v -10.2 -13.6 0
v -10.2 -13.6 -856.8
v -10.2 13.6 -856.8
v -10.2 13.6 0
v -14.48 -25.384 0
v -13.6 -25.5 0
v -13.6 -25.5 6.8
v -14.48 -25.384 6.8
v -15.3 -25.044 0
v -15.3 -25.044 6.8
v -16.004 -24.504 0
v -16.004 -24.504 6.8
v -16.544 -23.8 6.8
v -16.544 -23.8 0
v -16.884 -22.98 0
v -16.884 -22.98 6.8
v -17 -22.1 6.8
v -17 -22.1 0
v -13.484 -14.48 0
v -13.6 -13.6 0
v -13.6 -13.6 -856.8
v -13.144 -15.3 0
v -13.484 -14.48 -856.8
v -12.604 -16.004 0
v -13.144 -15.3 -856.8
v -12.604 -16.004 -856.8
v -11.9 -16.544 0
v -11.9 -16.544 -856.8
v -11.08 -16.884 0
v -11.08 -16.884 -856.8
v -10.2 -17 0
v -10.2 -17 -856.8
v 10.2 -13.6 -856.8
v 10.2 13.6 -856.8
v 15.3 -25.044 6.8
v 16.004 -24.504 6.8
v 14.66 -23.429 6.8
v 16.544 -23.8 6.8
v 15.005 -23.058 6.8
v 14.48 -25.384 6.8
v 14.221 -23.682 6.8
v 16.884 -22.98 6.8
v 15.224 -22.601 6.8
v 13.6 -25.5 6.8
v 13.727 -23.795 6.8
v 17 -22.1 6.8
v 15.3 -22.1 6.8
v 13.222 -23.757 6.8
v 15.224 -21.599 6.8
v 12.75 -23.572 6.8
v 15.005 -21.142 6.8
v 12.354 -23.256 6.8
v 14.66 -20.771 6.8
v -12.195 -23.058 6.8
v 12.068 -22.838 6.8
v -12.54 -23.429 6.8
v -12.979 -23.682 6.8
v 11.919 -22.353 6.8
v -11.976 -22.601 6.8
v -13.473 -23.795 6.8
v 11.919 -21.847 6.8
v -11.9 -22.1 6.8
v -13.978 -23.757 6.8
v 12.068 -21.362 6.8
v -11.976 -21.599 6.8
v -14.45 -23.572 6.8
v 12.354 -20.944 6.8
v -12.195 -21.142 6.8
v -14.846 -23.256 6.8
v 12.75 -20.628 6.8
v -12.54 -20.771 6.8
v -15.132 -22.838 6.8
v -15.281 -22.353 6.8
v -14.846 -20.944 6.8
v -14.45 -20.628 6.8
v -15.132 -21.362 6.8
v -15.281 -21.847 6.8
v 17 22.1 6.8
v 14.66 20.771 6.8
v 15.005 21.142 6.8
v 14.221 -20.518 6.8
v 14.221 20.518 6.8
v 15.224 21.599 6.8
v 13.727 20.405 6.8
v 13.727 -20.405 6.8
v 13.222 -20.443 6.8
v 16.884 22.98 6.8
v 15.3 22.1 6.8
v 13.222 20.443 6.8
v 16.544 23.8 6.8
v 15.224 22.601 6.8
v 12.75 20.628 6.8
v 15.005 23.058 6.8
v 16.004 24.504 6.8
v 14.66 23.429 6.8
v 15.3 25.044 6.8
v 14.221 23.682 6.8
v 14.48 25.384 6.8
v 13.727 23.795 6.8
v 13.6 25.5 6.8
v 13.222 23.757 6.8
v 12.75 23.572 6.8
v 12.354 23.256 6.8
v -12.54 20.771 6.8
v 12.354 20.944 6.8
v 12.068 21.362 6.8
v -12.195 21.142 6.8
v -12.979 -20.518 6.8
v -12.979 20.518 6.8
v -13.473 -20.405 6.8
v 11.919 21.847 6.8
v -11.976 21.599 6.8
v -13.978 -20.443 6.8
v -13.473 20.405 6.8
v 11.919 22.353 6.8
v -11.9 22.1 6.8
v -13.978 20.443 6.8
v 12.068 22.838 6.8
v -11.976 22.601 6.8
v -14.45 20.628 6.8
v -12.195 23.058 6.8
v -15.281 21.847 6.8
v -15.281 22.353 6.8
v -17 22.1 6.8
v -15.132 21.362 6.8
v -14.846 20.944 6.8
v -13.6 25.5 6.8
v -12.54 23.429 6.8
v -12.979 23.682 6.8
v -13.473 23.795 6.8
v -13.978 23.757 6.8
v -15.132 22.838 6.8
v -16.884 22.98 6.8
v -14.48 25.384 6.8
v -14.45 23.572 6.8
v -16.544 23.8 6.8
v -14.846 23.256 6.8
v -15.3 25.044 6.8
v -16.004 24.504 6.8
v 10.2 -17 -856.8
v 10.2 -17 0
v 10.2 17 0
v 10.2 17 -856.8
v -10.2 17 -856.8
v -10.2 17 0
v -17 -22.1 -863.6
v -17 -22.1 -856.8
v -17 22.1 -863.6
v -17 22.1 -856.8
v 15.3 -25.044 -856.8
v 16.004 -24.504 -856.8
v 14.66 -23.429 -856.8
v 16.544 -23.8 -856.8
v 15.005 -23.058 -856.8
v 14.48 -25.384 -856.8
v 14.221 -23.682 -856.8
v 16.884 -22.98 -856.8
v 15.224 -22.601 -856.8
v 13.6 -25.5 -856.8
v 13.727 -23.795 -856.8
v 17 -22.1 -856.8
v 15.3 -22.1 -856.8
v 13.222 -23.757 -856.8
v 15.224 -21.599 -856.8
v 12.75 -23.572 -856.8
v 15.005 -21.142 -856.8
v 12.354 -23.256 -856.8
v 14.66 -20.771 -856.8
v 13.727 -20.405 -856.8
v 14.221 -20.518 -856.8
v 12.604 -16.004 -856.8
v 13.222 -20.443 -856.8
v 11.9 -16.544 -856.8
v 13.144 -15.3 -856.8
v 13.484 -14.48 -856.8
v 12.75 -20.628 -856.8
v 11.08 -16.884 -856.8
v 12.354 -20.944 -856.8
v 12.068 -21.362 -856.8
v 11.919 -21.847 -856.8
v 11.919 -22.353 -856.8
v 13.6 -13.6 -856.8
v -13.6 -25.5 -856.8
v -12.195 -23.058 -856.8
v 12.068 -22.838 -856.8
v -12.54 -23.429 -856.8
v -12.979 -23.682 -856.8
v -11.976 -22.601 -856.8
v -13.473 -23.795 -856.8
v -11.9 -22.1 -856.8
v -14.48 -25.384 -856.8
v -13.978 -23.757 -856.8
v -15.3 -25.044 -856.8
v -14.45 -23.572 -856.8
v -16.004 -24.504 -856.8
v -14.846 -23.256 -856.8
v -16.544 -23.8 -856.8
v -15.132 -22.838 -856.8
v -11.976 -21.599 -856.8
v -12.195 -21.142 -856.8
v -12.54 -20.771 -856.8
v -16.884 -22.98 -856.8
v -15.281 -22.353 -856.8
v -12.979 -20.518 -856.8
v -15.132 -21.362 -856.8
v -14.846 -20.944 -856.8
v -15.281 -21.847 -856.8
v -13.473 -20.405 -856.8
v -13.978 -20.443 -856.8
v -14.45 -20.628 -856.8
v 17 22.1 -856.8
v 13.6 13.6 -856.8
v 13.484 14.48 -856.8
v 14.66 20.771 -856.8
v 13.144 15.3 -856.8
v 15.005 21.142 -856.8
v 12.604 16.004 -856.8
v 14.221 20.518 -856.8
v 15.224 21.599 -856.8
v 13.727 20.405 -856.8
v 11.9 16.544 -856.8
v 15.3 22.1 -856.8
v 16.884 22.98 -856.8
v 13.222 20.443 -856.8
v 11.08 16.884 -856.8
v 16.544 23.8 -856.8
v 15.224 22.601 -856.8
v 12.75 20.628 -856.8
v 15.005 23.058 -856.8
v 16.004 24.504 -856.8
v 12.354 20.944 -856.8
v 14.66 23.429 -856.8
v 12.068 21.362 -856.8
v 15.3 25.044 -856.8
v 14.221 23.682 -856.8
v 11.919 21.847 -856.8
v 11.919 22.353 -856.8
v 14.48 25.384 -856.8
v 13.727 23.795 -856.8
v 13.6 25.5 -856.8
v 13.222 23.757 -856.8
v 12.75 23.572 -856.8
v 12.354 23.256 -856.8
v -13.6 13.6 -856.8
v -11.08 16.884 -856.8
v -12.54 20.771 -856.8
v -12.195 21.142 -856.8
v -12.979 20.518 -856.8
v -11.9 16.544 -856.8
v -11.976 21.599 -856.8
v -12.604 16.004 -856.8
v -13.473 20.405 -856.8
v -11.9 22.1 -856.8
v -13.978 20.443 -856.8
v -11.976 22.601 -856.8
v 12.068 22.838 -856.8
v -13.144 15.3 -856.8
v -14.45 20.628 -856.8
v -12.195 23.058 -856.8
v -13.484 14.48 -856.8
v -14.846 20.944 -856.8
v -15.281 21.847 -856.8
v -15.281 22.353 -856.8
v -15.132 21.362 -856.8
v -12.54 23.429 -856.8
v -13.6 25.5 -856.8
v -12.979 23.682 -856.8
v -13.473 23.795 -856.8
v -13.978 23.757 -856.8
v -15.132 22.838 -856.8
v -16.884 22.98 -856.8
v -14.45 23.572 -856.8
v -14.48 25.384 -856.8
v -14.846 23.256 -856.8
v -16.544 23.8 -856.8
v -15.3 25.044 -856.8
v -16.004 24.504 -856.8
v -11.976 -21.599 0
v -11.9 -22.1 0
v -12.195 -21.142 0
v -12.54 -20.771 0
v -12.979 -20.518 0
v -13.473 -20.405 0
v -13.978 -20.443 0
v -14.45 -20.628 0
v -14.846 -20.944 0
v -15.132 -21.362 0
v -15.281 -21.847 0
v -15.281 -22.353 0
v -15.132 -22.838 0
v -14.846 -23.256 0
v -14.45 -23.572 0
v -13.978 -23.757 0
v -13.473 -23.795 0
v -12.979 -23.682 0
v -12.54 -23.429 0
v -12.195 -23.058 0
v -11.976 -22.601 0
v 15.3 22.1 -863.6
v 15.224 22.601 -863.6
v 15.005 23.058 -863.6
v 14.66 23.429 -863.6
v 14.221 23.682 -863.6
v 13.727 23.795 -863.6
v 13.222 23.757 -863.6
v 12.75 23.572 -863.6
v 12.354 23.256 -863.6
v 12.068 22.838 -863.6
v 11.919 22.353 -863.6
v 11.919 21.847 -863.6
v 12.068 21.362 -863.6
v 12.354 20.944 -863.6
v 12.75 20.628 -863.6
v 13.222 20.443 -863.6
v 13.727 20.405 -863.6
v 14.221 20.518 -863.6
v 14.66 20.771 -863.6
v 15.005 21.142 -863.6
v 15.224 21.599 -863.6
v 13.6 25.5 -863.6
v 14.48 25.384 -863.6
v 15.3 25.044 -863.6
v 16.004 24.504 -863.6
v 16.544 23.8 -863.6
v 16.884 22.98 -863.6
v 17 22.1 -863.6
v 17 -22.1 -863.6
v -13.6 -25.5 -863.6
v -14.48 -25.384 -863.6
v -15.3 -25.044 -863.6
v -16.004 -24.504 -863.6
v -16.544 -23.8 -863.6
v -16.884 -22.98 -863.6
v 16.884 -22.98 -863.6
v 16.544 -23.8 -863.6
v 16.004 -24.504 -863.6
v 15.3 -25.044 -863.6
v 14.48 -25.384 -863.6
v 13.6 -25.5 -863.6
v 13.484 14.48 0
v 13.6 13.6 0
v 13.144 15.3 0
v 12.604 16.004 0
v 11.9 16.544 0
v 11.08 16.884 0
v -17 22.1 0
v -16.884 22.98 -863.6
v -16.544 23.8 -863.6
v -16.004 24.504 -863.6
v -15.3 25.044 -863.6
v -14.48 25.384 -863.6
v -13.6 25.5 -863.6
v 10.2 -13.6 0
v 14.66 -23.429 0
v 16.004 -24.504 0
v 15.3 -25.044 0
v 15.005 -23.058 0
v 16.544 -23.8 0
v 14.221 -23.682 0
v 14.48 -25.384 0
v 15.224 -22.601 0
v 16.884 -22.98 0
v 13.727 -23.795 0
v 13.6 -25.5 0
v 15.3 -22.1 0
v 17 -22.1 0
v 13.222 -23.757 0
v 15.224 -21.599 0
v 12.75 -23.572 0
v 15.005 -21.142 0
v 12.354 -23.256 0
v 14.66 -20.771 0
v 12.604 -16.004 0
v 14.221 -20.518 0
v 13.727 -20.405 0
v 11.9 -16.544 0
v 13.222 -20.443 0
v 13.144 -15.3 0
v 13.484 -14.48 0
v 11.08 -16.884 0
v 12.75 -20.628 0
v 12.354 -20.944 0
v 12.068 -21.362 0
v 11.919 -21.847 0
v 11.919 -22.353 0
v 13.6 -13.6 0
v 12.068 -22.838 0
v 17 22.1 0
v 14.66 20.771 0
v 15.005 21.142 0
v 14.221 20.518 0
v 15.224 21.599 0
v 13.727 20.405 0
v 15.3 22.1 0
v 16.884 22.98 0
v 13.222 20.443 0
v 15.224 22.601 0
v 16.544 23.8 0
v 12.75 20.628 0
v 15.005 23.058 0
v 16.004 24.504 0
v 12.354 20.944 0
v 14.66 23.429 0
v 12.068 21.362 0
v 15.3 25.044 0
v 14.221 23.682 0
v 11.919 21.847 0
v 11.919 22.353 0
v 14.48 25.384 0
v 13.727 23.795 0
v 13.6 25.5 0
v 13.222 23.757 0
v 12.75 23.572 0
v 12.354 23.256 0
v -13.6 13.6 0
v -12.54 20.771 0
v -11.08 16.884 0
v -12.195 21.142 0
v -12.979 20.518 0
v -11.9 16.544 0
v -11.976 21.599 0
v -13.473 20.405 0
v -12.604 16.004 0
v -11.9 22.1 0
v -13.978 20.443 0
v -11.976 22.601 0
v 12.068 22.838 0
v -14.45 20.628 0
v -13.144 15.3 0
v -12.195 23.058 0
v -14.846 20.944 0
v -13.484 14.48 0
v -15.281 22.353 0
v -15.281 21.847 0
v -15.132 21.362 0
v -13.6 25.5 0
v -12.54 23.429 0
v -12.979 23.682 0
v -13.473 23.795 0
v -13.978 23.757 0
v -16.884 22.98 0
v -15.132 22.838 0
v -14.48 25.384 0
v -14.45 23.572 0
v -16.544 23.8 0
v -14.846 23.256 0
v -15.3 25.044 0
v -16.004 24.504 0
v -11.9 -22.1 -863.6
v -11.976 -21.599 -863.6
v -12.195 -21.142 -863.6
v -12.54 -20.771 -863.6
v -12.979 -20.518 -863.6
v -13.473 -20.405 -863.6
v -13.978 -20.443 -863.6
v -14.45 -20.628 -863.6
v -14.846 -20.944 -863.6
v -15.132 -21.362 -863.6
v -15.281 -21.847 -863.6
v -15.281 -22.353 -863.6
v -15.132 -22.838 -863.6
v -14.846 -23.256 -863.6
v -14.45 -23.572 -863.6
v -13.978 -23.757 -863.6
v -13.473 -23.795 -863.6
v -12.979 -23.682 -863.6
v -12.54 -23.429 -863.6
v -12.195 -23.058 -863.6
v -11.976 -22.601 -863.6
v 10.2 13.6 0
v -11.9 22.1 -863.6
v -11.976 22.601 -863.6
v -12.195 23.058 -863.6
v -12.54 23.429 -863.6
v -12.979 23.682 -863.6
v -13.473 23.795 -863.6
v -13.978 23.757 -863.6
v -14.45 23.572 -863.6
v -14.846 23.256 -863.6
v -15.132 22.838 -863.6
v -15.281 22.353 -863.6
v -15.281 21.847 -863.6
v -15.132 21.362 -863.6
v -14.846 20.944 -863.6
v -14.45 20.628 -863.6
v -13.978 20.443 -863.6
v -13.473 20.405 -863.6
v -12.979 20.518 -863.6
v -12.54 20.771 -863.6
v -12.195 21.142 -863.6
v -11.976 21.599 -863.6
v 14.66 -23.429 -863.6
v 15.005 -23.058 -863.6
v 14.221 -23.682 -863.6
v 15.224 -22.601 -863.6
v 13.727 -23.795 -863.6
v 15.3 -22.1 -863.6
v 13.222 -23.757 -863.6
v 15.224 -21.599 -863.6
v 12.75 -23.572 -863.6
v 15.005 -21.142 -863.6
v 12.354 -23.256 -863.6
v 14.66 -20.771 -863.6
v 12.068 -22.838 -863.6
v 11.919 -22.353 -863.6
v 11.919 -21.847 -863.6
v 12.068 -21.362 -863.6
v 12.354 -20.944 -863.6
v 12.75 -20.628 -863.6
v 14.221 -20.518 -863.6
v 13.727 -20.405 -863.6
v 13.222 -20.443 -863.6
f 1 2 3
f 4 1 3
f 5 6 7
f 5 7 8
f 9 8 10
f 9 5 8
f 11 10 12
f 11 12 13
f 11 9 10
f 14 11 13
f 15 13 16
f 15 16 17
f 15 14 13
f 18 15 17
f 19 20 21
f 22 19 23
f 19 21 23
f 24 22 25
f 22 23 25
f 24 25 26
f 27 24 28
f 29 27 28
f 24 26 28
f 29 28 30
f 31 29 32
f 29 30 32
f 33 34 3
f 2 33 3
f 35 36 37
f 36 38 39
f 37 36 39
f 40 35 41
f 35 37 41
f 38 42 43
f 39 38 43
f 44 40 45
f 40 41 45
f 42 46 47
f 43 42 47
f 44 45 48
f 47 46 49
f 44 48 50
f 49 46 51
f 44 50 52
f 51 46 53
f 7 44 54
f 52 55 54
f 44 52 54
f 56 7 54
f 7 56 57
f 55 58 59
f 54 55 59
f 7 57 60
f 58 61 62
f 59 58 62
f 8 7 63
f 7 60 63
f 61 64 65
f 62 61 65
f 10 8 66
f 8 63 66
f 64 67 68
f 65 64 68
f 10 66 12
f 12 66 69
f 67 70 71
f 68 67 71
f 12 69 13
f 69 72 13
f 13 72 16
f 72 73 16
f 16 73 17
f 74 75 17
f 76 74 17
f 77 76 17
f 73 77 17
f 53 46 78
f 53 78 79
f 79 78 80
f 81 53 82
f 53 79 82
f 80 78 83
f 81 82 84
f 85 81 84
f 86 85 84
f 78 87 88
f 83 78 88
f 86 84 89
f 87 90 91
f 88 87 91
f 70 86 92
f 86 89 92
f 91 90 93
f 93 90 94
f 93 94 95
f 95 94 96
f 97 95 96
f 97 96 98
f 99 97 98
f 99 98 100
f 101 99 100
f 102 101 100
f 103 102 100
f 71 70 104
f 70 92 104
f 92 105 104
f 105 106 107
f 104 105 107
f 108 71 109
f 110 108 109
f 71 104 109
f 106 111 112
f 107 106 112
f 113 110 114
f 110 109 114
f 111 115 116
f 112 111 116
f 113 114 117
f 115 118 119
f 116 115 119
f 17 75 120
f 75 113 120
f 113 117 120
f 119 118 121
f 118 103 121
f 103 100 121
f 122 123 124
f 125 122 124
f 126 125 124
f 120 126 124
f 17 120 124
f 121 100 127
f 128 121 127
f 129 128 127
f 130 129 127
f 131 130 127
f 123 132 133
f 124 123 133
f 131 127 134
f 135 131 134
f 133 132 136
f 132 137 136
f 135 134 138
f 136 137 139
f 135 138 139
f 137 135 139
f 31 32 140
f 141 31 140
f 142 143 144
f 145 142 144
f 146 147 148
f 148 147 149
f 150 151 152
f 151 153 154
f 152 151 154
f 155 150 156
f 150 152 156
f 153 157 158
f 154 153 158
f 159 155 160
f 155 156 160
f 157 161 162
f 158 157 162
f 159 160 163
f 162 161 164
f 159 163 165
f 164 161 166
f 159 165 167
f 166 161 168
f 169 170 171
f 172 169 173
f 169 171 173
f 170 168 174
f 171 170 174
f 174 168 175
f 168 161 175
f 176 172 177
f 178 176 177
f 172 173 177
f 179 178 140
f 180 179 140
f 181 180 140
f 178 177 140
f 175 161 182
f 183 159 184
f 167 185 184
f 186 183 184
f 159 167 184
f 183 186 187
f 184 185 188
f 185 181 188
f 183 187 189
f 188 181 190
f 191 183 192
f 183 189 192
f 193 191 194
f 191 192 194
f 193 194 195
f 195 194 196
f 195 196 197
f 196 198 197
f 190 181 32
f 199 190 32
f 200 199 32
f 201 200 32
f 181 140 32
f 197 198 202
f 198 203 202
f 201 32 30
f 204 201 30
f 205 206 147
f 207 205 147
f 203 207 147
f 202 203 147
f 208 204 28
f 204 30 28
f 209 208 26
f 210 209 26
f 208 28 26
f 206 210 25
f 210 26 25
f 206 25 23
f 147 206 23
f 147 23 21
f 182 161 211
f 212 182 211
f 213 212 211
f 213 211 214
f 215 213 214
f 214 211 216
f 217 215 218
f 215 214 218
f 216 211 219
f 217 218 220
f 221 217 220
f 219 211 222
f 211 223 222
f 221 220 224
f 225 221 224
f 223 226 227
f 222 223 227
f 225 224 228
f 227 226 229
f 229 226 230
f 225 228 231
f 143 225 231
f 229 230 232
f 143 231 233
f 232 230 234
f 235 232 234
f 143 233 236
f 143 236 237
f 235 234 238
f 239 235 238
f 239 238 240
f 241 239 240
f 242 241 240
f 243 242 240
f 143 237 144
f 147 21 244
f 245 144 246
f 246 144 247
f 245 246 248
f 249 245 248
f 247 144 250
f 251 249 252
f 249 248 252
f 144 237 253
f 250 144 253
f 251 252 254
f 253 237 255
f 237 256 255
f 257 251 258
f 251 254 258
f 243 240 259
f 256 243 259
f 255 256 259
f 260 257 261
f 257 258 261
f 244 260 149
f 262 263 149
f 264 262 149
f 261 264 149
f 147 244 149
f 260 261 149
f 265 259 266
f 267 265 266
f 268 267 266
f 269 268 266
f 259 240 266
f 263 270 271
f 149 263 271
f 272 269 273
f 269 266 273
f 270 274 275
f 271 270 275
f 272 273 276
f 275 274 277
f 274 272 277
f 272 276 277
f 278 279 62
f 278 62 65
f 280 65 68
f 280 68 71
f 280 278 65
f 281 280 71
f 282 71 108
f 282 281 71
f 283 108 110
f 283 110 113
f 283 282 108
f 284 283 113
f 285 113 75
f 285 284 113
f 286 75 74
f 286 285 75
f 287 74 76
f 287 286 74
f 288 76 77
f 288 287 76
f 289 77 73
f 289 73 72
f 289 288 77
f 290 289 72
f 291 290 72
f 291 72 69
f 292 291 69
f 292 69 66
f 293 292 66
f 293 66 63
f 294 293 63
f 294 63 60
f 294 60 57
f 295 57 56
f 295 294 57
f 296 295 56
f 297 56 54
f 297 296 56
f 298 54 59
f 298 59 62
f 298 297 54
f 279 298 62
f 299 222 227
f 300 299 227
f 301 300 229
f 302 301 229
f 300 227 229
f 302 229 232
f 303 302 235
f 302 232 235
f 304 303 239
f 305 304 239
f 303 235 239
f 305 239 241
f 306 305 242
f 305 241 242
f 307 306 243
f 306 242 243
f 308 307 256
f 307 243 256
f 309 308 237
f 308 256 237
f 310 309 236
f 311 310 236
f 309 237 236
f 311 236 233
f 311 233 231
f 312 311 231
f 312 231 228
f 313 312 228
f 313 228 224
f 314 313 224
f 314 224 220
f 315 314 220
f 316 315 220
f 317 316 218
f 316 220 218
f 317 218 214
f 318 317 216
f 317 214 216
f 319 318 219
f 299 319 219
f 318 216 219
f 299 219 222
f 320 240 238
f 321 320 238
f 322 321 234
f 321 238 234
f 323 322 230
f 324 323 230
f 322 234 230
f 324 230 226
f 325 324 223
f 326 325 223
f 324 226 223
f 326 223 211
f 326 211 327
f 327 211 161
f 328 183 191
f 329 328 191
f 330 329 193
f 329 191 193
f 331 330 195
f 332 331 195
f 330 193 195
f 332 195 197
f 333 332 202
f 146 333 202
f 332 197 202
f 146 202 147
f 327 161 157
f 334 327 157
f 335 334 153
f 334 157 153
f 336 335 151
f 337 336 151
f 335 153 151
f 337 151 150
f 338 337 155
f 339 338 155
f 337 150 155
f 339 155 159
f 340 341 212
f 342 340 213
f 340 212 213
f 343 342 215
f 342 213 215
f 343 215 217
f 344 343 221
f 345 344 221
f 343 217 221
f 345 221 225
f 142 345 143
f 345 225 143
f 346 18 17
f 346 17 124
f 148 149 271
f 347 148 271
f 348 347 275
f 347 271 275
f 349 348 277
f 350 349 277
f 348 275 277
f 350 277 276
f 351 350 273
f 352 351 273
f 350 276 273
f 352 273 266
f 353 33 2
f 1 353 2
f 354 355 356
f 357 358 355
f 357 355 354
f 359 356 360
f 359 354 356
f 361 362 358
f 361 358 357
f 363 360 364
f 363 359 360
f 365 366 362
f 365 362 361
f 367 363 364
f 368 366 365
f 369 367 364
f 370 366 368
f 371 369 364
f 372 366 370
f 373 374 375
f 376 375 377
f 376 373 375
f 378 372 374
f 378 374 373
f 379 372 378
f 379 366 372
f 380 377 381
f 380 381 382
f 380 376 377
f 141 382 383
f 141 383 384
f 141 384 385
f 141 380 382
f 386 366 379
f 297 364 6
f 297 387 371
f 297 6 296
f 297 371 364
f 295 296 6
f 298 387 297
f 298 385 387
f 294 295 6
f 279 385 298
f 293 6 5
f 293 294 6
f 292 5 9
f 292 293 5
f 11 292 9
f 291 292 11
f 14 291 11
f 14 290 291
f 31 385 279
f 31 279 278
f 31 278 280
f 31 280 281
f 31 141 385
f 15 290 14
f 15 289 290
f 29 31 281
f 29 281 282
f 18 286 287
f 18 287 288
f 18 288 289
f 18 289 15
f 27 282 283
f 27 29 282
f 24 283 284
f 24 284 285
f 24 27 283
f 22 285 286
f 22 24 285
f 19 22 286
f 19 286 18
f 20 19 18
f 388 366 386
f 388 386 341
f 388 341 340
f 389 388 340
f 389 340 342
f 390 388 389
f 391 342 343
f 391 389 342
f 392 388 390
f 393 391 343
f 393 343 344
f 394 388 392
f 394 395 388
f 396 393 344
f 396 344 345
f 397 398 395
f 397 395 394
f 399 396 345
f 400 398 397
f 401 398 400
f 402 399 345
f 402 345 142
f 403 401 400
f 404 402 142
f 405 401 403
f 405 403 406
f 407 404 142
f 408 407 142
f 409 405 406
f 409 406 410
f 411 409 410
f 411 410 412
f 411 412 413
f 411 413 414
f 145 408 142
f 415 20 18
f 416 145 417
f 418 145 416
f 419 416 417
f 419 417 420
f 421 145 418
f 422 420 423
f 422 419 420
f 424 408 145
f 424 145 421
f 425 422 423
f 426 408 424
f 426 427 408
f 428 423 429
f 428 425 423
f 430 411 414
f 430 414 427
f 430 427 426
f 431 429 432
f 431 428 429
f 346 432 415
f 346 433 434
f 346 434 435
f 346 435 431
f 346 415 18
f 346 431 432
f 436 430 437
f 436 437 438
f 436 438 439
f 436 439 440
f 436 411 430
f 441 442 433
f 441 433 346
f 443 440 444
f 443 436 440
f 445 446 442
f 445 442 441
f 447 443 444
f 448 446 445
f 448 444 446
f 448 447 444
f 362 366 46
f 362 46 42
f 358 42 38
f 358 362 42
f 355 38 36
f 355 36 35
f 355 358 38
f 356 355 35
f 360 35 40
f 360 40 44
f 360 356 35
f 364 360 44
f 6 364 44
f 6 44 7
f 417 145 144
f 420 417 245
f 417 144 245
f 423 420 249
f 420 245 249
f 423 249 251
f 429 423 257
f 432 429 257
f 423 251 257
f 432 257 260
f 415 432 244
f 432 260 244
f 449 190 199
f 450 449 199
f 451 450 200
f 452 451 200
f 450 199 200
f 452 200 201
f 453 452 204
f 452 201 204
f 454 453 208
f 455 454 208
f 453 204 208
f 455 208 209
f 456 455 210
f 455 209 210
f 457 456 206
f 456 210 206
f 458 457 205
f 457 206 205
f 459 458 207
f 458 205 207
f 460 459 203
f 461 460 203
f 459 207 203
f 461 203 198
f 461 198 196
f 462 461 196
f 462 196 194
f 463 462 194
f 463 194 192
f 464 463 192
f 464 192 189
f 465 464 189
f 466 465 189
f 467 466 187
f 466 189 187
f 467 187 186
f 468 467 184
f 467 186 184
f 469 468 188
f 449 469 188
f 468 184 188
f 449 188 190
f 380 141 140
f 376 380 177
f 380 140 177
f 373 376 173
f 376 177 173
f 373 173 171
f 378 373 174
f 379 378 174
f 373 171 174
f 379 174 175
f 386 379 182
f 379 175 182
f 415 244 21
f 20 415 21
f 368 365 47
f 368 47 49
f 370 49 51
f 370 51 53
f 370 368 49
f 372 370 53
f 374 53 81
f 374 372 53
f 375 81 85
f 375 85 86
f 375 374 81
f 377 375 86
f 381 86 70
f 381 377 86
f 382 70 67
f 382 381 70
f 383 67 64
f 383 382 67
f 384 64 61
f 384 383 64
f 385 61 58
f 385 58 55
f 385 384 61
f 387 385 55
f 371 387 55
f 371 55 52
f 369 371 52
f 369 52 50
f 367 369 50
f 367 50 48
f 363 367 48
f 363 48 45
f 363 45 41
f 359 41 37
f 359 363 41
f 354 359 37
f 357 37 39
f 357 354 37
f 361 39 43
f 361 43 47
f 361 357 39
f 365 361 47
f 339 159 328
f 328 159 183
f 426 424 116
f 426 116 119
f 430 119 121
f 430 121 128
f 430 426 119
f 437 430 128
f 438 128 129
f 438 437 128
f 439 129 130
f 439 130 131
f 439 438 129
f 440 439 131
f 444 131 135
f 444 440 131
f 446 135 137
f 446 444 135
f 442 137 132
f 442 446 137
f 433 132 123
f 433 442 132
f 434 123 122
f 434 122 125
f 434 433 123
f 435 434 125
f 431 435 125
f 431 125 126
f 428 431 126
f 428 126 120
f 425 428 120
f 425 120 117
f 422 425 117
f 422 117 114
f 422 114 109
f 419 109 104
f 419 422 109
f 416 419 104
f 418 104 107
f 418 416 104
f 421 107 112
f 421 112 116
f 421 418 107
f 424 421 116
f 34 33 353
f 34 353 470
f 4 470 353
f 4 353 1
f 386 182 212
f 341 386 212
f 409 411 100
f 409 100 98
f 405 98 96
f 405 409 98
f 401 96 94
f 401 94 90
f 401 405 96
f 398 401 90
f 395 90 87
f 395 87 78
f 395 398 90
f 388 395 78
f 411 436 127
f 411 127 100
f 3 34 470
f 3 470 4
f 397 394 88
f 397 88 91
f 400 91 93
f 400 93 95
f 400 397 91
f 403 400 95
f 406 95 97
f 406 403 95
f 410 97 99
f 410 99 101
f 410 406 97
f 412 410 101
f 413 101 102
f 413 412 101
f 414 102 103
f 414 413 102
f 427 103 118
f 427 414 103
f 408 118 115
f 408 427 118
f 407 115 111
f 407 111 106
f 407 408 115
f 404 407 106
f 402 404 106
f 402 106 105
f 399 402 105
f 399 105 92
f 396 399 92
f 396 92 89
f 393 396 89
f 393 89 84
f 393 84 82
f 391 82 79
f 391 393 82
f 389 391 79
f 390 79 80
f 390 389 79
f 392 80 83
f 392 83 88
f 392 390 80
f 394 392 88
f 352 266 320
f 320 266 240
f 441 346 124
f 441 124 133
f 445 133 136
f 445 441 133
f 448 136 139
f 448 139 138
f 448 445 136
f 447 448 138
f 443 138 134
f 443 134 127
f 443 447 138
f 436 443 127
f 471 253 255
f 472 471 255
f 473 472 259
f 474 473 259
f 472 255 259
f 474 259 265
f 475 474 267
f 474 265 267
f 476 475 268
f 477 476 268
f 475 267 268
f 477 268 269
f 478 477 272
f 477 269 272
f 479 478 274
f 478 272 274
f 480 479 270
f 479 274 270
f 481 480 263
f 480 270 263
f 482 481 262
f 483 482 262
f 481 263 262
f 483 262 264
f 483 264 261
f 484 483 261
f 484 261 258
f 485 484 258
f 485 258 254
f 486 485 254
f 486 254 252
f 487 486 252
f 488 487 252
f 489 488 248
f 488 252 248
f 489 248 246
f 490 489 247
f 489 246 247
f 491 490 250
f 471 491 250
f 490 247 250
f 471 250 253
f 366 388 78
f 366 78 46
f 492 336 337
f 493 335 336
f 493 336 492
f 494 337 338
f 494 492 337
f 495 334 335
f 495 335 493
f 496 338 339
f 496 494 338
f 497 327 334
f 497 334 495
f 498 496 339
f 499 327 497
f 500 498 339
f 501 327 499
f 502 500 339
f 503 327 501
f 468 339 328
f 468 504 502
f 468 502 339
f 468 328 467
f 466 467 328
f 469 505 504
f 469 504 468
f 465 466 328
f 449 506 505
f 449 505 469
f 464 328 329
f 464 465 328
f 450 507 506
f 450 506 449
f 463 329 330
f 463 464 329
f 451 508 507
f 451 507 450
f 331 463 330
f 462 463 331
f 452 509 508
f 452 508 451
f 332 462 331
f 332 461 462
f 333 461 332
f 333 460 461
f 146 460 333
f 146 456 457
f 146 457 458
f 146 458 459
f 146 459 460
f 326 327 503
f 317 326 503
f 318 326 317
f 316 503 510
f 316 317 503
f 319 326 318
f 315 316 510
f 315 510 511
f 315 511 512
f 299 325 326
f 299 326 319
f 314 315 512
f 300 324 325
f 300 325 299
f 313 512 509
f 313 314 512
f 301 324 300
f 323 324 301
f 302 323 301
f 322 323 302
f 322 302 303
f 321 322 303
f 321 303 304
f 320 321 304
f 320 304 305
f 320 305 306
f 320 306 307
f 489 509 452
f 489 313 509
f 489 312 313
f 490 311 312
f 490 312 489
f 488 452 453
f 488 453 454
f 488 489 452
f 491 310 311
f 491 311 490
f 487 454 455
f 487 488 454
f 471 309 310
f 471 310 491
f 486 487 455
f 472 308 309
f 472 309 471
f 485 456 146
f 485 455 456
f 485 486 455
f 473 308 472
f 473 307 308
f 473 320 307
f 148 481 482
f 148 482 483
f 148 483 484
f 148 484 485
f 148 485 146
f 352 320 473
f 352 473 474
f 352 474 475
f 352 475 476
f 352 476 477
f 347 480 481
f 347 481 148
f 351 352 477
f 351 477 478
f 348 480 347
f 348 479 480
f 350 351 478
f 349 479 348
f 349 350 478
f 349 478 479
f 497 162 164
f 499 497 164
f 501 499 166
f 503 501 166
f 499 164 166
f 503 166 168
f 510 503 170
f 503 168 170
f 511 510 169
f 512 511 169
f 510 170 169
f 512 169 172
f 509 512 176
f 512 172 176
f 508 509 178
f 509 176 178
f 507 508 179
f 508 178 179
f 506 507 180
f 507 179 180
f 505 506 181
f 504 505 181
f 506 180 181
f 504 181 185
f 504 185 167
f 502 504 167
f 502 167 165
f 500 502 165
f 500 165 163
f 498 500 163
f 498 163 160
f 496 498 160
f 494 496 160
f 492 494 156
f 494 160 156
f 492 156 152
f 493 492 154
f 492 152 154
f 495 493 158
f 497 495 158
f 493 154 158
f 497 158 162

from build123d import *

# Parameters (mm, degrees)
SKETCH_1_R        = 0.5
EXTRUDE_1_DEPTH   = 2
SKETCH_2_W        = 6
SKETCH_2_H        = 8
EXTRUDE_1_2_DEPTH = 126
SCALE_1_SCALE     = 2
SCALE_2_SCALE     = 1.7


with BuildPart() as part:
    # 草图1 → Extrude 1 (new body)
    with BuildSketch(Plane.XY):
        with BuildLine():
            Line((-4, 7.5), (4, 7.5))
            ThreePointArc((4, 7.5), (4.707106781, 7.207106781), (5, 6.5))
            Line((5, 6.5), (5, -6.5))
            ThreePointArc((5, -6.5), (4.707106781, -7.207106781), (4, -7.5))
            Line((4, -7.5), (-4, -7.5))
            ThreePointArc((-4, -7.5), (-4.707106781, -7.207106781), (-5, -6.5))
            Line((-5, -6.5), (-5, 6.5))
            ThreePointArc((-5, 6.5), (-4.707106781, 7.207106781), (-4, 7.5))
        make_face()
        with Locations((4, 6.5)):
            Circle(SKETCH_1_R, mode=Mode.SUBTRACT)
        with Locations((-4, 6.5)):
            Circle(SKETCH_1_R, mode=Mode.SUBTRACT)
        with Locations((4, -6.5)):
            Circle(SKETCH_1_R, mode=Mode.SUBTRACT)
        with Locations((-4, -6.5)):
            Circle(SKETCH_1_R, mode=Mode.SUBTRACT)
    extrude(amount=EXTRUDE_1_DEPTH)

    # 草图2 → Extrude 1 2 (add)
    with BuildSketch(Plane(origin=(0, 0, 0), x_dir=(-1, 0, 0), z_dir=(0, 0, -1))):
        with BuildLine():
            Line((-3, 5), (3, 5))
            ThreePointArc((3, 5), (3.707106781, 4.707106781), (4, 4))
            Line((4, 4), (4, -4))
            ThreePointArc((4, -4), (3.707106781, -4.707106781), (3, -5))
            Line((3, -5), (-3, -5))
            ThreePointArc((-3, -5), (-3.707106781, -4.707106781), (-4, -4))
            Line((-4, -4), (-4, 4))
            ThreePointArc((-4, 4), (-3.707106781, 4.707106781), (-3, 5))
        make_face()
        Rectangle(SKETCH_2_W, SKETCH_2_H, mode=Mode.SUBTRACT)
    extrude(amount=EXTRUDE_1_2_DEPTH)

    # 镜向1: part across plane


with BuildPart() as part_1:
    add(part.part)
    add(part.part.mirror(Plane(origin=(3, -4, -126), x_dir=(1, 0, 0), z_dir=(0, 0, -1))))


with BuildPart() as part_2:
    # 缩放比例1: scaled about (0, 0, 0)
    add(part_1.part.scale(SCALE_1_SCALE))


with BuildPart() as part_3:
    # 缩放比例2: scaled about (0, 0, 0)
    add(part_2.part.scale(SCALE_2_SCALE))


solid = part_3.part
